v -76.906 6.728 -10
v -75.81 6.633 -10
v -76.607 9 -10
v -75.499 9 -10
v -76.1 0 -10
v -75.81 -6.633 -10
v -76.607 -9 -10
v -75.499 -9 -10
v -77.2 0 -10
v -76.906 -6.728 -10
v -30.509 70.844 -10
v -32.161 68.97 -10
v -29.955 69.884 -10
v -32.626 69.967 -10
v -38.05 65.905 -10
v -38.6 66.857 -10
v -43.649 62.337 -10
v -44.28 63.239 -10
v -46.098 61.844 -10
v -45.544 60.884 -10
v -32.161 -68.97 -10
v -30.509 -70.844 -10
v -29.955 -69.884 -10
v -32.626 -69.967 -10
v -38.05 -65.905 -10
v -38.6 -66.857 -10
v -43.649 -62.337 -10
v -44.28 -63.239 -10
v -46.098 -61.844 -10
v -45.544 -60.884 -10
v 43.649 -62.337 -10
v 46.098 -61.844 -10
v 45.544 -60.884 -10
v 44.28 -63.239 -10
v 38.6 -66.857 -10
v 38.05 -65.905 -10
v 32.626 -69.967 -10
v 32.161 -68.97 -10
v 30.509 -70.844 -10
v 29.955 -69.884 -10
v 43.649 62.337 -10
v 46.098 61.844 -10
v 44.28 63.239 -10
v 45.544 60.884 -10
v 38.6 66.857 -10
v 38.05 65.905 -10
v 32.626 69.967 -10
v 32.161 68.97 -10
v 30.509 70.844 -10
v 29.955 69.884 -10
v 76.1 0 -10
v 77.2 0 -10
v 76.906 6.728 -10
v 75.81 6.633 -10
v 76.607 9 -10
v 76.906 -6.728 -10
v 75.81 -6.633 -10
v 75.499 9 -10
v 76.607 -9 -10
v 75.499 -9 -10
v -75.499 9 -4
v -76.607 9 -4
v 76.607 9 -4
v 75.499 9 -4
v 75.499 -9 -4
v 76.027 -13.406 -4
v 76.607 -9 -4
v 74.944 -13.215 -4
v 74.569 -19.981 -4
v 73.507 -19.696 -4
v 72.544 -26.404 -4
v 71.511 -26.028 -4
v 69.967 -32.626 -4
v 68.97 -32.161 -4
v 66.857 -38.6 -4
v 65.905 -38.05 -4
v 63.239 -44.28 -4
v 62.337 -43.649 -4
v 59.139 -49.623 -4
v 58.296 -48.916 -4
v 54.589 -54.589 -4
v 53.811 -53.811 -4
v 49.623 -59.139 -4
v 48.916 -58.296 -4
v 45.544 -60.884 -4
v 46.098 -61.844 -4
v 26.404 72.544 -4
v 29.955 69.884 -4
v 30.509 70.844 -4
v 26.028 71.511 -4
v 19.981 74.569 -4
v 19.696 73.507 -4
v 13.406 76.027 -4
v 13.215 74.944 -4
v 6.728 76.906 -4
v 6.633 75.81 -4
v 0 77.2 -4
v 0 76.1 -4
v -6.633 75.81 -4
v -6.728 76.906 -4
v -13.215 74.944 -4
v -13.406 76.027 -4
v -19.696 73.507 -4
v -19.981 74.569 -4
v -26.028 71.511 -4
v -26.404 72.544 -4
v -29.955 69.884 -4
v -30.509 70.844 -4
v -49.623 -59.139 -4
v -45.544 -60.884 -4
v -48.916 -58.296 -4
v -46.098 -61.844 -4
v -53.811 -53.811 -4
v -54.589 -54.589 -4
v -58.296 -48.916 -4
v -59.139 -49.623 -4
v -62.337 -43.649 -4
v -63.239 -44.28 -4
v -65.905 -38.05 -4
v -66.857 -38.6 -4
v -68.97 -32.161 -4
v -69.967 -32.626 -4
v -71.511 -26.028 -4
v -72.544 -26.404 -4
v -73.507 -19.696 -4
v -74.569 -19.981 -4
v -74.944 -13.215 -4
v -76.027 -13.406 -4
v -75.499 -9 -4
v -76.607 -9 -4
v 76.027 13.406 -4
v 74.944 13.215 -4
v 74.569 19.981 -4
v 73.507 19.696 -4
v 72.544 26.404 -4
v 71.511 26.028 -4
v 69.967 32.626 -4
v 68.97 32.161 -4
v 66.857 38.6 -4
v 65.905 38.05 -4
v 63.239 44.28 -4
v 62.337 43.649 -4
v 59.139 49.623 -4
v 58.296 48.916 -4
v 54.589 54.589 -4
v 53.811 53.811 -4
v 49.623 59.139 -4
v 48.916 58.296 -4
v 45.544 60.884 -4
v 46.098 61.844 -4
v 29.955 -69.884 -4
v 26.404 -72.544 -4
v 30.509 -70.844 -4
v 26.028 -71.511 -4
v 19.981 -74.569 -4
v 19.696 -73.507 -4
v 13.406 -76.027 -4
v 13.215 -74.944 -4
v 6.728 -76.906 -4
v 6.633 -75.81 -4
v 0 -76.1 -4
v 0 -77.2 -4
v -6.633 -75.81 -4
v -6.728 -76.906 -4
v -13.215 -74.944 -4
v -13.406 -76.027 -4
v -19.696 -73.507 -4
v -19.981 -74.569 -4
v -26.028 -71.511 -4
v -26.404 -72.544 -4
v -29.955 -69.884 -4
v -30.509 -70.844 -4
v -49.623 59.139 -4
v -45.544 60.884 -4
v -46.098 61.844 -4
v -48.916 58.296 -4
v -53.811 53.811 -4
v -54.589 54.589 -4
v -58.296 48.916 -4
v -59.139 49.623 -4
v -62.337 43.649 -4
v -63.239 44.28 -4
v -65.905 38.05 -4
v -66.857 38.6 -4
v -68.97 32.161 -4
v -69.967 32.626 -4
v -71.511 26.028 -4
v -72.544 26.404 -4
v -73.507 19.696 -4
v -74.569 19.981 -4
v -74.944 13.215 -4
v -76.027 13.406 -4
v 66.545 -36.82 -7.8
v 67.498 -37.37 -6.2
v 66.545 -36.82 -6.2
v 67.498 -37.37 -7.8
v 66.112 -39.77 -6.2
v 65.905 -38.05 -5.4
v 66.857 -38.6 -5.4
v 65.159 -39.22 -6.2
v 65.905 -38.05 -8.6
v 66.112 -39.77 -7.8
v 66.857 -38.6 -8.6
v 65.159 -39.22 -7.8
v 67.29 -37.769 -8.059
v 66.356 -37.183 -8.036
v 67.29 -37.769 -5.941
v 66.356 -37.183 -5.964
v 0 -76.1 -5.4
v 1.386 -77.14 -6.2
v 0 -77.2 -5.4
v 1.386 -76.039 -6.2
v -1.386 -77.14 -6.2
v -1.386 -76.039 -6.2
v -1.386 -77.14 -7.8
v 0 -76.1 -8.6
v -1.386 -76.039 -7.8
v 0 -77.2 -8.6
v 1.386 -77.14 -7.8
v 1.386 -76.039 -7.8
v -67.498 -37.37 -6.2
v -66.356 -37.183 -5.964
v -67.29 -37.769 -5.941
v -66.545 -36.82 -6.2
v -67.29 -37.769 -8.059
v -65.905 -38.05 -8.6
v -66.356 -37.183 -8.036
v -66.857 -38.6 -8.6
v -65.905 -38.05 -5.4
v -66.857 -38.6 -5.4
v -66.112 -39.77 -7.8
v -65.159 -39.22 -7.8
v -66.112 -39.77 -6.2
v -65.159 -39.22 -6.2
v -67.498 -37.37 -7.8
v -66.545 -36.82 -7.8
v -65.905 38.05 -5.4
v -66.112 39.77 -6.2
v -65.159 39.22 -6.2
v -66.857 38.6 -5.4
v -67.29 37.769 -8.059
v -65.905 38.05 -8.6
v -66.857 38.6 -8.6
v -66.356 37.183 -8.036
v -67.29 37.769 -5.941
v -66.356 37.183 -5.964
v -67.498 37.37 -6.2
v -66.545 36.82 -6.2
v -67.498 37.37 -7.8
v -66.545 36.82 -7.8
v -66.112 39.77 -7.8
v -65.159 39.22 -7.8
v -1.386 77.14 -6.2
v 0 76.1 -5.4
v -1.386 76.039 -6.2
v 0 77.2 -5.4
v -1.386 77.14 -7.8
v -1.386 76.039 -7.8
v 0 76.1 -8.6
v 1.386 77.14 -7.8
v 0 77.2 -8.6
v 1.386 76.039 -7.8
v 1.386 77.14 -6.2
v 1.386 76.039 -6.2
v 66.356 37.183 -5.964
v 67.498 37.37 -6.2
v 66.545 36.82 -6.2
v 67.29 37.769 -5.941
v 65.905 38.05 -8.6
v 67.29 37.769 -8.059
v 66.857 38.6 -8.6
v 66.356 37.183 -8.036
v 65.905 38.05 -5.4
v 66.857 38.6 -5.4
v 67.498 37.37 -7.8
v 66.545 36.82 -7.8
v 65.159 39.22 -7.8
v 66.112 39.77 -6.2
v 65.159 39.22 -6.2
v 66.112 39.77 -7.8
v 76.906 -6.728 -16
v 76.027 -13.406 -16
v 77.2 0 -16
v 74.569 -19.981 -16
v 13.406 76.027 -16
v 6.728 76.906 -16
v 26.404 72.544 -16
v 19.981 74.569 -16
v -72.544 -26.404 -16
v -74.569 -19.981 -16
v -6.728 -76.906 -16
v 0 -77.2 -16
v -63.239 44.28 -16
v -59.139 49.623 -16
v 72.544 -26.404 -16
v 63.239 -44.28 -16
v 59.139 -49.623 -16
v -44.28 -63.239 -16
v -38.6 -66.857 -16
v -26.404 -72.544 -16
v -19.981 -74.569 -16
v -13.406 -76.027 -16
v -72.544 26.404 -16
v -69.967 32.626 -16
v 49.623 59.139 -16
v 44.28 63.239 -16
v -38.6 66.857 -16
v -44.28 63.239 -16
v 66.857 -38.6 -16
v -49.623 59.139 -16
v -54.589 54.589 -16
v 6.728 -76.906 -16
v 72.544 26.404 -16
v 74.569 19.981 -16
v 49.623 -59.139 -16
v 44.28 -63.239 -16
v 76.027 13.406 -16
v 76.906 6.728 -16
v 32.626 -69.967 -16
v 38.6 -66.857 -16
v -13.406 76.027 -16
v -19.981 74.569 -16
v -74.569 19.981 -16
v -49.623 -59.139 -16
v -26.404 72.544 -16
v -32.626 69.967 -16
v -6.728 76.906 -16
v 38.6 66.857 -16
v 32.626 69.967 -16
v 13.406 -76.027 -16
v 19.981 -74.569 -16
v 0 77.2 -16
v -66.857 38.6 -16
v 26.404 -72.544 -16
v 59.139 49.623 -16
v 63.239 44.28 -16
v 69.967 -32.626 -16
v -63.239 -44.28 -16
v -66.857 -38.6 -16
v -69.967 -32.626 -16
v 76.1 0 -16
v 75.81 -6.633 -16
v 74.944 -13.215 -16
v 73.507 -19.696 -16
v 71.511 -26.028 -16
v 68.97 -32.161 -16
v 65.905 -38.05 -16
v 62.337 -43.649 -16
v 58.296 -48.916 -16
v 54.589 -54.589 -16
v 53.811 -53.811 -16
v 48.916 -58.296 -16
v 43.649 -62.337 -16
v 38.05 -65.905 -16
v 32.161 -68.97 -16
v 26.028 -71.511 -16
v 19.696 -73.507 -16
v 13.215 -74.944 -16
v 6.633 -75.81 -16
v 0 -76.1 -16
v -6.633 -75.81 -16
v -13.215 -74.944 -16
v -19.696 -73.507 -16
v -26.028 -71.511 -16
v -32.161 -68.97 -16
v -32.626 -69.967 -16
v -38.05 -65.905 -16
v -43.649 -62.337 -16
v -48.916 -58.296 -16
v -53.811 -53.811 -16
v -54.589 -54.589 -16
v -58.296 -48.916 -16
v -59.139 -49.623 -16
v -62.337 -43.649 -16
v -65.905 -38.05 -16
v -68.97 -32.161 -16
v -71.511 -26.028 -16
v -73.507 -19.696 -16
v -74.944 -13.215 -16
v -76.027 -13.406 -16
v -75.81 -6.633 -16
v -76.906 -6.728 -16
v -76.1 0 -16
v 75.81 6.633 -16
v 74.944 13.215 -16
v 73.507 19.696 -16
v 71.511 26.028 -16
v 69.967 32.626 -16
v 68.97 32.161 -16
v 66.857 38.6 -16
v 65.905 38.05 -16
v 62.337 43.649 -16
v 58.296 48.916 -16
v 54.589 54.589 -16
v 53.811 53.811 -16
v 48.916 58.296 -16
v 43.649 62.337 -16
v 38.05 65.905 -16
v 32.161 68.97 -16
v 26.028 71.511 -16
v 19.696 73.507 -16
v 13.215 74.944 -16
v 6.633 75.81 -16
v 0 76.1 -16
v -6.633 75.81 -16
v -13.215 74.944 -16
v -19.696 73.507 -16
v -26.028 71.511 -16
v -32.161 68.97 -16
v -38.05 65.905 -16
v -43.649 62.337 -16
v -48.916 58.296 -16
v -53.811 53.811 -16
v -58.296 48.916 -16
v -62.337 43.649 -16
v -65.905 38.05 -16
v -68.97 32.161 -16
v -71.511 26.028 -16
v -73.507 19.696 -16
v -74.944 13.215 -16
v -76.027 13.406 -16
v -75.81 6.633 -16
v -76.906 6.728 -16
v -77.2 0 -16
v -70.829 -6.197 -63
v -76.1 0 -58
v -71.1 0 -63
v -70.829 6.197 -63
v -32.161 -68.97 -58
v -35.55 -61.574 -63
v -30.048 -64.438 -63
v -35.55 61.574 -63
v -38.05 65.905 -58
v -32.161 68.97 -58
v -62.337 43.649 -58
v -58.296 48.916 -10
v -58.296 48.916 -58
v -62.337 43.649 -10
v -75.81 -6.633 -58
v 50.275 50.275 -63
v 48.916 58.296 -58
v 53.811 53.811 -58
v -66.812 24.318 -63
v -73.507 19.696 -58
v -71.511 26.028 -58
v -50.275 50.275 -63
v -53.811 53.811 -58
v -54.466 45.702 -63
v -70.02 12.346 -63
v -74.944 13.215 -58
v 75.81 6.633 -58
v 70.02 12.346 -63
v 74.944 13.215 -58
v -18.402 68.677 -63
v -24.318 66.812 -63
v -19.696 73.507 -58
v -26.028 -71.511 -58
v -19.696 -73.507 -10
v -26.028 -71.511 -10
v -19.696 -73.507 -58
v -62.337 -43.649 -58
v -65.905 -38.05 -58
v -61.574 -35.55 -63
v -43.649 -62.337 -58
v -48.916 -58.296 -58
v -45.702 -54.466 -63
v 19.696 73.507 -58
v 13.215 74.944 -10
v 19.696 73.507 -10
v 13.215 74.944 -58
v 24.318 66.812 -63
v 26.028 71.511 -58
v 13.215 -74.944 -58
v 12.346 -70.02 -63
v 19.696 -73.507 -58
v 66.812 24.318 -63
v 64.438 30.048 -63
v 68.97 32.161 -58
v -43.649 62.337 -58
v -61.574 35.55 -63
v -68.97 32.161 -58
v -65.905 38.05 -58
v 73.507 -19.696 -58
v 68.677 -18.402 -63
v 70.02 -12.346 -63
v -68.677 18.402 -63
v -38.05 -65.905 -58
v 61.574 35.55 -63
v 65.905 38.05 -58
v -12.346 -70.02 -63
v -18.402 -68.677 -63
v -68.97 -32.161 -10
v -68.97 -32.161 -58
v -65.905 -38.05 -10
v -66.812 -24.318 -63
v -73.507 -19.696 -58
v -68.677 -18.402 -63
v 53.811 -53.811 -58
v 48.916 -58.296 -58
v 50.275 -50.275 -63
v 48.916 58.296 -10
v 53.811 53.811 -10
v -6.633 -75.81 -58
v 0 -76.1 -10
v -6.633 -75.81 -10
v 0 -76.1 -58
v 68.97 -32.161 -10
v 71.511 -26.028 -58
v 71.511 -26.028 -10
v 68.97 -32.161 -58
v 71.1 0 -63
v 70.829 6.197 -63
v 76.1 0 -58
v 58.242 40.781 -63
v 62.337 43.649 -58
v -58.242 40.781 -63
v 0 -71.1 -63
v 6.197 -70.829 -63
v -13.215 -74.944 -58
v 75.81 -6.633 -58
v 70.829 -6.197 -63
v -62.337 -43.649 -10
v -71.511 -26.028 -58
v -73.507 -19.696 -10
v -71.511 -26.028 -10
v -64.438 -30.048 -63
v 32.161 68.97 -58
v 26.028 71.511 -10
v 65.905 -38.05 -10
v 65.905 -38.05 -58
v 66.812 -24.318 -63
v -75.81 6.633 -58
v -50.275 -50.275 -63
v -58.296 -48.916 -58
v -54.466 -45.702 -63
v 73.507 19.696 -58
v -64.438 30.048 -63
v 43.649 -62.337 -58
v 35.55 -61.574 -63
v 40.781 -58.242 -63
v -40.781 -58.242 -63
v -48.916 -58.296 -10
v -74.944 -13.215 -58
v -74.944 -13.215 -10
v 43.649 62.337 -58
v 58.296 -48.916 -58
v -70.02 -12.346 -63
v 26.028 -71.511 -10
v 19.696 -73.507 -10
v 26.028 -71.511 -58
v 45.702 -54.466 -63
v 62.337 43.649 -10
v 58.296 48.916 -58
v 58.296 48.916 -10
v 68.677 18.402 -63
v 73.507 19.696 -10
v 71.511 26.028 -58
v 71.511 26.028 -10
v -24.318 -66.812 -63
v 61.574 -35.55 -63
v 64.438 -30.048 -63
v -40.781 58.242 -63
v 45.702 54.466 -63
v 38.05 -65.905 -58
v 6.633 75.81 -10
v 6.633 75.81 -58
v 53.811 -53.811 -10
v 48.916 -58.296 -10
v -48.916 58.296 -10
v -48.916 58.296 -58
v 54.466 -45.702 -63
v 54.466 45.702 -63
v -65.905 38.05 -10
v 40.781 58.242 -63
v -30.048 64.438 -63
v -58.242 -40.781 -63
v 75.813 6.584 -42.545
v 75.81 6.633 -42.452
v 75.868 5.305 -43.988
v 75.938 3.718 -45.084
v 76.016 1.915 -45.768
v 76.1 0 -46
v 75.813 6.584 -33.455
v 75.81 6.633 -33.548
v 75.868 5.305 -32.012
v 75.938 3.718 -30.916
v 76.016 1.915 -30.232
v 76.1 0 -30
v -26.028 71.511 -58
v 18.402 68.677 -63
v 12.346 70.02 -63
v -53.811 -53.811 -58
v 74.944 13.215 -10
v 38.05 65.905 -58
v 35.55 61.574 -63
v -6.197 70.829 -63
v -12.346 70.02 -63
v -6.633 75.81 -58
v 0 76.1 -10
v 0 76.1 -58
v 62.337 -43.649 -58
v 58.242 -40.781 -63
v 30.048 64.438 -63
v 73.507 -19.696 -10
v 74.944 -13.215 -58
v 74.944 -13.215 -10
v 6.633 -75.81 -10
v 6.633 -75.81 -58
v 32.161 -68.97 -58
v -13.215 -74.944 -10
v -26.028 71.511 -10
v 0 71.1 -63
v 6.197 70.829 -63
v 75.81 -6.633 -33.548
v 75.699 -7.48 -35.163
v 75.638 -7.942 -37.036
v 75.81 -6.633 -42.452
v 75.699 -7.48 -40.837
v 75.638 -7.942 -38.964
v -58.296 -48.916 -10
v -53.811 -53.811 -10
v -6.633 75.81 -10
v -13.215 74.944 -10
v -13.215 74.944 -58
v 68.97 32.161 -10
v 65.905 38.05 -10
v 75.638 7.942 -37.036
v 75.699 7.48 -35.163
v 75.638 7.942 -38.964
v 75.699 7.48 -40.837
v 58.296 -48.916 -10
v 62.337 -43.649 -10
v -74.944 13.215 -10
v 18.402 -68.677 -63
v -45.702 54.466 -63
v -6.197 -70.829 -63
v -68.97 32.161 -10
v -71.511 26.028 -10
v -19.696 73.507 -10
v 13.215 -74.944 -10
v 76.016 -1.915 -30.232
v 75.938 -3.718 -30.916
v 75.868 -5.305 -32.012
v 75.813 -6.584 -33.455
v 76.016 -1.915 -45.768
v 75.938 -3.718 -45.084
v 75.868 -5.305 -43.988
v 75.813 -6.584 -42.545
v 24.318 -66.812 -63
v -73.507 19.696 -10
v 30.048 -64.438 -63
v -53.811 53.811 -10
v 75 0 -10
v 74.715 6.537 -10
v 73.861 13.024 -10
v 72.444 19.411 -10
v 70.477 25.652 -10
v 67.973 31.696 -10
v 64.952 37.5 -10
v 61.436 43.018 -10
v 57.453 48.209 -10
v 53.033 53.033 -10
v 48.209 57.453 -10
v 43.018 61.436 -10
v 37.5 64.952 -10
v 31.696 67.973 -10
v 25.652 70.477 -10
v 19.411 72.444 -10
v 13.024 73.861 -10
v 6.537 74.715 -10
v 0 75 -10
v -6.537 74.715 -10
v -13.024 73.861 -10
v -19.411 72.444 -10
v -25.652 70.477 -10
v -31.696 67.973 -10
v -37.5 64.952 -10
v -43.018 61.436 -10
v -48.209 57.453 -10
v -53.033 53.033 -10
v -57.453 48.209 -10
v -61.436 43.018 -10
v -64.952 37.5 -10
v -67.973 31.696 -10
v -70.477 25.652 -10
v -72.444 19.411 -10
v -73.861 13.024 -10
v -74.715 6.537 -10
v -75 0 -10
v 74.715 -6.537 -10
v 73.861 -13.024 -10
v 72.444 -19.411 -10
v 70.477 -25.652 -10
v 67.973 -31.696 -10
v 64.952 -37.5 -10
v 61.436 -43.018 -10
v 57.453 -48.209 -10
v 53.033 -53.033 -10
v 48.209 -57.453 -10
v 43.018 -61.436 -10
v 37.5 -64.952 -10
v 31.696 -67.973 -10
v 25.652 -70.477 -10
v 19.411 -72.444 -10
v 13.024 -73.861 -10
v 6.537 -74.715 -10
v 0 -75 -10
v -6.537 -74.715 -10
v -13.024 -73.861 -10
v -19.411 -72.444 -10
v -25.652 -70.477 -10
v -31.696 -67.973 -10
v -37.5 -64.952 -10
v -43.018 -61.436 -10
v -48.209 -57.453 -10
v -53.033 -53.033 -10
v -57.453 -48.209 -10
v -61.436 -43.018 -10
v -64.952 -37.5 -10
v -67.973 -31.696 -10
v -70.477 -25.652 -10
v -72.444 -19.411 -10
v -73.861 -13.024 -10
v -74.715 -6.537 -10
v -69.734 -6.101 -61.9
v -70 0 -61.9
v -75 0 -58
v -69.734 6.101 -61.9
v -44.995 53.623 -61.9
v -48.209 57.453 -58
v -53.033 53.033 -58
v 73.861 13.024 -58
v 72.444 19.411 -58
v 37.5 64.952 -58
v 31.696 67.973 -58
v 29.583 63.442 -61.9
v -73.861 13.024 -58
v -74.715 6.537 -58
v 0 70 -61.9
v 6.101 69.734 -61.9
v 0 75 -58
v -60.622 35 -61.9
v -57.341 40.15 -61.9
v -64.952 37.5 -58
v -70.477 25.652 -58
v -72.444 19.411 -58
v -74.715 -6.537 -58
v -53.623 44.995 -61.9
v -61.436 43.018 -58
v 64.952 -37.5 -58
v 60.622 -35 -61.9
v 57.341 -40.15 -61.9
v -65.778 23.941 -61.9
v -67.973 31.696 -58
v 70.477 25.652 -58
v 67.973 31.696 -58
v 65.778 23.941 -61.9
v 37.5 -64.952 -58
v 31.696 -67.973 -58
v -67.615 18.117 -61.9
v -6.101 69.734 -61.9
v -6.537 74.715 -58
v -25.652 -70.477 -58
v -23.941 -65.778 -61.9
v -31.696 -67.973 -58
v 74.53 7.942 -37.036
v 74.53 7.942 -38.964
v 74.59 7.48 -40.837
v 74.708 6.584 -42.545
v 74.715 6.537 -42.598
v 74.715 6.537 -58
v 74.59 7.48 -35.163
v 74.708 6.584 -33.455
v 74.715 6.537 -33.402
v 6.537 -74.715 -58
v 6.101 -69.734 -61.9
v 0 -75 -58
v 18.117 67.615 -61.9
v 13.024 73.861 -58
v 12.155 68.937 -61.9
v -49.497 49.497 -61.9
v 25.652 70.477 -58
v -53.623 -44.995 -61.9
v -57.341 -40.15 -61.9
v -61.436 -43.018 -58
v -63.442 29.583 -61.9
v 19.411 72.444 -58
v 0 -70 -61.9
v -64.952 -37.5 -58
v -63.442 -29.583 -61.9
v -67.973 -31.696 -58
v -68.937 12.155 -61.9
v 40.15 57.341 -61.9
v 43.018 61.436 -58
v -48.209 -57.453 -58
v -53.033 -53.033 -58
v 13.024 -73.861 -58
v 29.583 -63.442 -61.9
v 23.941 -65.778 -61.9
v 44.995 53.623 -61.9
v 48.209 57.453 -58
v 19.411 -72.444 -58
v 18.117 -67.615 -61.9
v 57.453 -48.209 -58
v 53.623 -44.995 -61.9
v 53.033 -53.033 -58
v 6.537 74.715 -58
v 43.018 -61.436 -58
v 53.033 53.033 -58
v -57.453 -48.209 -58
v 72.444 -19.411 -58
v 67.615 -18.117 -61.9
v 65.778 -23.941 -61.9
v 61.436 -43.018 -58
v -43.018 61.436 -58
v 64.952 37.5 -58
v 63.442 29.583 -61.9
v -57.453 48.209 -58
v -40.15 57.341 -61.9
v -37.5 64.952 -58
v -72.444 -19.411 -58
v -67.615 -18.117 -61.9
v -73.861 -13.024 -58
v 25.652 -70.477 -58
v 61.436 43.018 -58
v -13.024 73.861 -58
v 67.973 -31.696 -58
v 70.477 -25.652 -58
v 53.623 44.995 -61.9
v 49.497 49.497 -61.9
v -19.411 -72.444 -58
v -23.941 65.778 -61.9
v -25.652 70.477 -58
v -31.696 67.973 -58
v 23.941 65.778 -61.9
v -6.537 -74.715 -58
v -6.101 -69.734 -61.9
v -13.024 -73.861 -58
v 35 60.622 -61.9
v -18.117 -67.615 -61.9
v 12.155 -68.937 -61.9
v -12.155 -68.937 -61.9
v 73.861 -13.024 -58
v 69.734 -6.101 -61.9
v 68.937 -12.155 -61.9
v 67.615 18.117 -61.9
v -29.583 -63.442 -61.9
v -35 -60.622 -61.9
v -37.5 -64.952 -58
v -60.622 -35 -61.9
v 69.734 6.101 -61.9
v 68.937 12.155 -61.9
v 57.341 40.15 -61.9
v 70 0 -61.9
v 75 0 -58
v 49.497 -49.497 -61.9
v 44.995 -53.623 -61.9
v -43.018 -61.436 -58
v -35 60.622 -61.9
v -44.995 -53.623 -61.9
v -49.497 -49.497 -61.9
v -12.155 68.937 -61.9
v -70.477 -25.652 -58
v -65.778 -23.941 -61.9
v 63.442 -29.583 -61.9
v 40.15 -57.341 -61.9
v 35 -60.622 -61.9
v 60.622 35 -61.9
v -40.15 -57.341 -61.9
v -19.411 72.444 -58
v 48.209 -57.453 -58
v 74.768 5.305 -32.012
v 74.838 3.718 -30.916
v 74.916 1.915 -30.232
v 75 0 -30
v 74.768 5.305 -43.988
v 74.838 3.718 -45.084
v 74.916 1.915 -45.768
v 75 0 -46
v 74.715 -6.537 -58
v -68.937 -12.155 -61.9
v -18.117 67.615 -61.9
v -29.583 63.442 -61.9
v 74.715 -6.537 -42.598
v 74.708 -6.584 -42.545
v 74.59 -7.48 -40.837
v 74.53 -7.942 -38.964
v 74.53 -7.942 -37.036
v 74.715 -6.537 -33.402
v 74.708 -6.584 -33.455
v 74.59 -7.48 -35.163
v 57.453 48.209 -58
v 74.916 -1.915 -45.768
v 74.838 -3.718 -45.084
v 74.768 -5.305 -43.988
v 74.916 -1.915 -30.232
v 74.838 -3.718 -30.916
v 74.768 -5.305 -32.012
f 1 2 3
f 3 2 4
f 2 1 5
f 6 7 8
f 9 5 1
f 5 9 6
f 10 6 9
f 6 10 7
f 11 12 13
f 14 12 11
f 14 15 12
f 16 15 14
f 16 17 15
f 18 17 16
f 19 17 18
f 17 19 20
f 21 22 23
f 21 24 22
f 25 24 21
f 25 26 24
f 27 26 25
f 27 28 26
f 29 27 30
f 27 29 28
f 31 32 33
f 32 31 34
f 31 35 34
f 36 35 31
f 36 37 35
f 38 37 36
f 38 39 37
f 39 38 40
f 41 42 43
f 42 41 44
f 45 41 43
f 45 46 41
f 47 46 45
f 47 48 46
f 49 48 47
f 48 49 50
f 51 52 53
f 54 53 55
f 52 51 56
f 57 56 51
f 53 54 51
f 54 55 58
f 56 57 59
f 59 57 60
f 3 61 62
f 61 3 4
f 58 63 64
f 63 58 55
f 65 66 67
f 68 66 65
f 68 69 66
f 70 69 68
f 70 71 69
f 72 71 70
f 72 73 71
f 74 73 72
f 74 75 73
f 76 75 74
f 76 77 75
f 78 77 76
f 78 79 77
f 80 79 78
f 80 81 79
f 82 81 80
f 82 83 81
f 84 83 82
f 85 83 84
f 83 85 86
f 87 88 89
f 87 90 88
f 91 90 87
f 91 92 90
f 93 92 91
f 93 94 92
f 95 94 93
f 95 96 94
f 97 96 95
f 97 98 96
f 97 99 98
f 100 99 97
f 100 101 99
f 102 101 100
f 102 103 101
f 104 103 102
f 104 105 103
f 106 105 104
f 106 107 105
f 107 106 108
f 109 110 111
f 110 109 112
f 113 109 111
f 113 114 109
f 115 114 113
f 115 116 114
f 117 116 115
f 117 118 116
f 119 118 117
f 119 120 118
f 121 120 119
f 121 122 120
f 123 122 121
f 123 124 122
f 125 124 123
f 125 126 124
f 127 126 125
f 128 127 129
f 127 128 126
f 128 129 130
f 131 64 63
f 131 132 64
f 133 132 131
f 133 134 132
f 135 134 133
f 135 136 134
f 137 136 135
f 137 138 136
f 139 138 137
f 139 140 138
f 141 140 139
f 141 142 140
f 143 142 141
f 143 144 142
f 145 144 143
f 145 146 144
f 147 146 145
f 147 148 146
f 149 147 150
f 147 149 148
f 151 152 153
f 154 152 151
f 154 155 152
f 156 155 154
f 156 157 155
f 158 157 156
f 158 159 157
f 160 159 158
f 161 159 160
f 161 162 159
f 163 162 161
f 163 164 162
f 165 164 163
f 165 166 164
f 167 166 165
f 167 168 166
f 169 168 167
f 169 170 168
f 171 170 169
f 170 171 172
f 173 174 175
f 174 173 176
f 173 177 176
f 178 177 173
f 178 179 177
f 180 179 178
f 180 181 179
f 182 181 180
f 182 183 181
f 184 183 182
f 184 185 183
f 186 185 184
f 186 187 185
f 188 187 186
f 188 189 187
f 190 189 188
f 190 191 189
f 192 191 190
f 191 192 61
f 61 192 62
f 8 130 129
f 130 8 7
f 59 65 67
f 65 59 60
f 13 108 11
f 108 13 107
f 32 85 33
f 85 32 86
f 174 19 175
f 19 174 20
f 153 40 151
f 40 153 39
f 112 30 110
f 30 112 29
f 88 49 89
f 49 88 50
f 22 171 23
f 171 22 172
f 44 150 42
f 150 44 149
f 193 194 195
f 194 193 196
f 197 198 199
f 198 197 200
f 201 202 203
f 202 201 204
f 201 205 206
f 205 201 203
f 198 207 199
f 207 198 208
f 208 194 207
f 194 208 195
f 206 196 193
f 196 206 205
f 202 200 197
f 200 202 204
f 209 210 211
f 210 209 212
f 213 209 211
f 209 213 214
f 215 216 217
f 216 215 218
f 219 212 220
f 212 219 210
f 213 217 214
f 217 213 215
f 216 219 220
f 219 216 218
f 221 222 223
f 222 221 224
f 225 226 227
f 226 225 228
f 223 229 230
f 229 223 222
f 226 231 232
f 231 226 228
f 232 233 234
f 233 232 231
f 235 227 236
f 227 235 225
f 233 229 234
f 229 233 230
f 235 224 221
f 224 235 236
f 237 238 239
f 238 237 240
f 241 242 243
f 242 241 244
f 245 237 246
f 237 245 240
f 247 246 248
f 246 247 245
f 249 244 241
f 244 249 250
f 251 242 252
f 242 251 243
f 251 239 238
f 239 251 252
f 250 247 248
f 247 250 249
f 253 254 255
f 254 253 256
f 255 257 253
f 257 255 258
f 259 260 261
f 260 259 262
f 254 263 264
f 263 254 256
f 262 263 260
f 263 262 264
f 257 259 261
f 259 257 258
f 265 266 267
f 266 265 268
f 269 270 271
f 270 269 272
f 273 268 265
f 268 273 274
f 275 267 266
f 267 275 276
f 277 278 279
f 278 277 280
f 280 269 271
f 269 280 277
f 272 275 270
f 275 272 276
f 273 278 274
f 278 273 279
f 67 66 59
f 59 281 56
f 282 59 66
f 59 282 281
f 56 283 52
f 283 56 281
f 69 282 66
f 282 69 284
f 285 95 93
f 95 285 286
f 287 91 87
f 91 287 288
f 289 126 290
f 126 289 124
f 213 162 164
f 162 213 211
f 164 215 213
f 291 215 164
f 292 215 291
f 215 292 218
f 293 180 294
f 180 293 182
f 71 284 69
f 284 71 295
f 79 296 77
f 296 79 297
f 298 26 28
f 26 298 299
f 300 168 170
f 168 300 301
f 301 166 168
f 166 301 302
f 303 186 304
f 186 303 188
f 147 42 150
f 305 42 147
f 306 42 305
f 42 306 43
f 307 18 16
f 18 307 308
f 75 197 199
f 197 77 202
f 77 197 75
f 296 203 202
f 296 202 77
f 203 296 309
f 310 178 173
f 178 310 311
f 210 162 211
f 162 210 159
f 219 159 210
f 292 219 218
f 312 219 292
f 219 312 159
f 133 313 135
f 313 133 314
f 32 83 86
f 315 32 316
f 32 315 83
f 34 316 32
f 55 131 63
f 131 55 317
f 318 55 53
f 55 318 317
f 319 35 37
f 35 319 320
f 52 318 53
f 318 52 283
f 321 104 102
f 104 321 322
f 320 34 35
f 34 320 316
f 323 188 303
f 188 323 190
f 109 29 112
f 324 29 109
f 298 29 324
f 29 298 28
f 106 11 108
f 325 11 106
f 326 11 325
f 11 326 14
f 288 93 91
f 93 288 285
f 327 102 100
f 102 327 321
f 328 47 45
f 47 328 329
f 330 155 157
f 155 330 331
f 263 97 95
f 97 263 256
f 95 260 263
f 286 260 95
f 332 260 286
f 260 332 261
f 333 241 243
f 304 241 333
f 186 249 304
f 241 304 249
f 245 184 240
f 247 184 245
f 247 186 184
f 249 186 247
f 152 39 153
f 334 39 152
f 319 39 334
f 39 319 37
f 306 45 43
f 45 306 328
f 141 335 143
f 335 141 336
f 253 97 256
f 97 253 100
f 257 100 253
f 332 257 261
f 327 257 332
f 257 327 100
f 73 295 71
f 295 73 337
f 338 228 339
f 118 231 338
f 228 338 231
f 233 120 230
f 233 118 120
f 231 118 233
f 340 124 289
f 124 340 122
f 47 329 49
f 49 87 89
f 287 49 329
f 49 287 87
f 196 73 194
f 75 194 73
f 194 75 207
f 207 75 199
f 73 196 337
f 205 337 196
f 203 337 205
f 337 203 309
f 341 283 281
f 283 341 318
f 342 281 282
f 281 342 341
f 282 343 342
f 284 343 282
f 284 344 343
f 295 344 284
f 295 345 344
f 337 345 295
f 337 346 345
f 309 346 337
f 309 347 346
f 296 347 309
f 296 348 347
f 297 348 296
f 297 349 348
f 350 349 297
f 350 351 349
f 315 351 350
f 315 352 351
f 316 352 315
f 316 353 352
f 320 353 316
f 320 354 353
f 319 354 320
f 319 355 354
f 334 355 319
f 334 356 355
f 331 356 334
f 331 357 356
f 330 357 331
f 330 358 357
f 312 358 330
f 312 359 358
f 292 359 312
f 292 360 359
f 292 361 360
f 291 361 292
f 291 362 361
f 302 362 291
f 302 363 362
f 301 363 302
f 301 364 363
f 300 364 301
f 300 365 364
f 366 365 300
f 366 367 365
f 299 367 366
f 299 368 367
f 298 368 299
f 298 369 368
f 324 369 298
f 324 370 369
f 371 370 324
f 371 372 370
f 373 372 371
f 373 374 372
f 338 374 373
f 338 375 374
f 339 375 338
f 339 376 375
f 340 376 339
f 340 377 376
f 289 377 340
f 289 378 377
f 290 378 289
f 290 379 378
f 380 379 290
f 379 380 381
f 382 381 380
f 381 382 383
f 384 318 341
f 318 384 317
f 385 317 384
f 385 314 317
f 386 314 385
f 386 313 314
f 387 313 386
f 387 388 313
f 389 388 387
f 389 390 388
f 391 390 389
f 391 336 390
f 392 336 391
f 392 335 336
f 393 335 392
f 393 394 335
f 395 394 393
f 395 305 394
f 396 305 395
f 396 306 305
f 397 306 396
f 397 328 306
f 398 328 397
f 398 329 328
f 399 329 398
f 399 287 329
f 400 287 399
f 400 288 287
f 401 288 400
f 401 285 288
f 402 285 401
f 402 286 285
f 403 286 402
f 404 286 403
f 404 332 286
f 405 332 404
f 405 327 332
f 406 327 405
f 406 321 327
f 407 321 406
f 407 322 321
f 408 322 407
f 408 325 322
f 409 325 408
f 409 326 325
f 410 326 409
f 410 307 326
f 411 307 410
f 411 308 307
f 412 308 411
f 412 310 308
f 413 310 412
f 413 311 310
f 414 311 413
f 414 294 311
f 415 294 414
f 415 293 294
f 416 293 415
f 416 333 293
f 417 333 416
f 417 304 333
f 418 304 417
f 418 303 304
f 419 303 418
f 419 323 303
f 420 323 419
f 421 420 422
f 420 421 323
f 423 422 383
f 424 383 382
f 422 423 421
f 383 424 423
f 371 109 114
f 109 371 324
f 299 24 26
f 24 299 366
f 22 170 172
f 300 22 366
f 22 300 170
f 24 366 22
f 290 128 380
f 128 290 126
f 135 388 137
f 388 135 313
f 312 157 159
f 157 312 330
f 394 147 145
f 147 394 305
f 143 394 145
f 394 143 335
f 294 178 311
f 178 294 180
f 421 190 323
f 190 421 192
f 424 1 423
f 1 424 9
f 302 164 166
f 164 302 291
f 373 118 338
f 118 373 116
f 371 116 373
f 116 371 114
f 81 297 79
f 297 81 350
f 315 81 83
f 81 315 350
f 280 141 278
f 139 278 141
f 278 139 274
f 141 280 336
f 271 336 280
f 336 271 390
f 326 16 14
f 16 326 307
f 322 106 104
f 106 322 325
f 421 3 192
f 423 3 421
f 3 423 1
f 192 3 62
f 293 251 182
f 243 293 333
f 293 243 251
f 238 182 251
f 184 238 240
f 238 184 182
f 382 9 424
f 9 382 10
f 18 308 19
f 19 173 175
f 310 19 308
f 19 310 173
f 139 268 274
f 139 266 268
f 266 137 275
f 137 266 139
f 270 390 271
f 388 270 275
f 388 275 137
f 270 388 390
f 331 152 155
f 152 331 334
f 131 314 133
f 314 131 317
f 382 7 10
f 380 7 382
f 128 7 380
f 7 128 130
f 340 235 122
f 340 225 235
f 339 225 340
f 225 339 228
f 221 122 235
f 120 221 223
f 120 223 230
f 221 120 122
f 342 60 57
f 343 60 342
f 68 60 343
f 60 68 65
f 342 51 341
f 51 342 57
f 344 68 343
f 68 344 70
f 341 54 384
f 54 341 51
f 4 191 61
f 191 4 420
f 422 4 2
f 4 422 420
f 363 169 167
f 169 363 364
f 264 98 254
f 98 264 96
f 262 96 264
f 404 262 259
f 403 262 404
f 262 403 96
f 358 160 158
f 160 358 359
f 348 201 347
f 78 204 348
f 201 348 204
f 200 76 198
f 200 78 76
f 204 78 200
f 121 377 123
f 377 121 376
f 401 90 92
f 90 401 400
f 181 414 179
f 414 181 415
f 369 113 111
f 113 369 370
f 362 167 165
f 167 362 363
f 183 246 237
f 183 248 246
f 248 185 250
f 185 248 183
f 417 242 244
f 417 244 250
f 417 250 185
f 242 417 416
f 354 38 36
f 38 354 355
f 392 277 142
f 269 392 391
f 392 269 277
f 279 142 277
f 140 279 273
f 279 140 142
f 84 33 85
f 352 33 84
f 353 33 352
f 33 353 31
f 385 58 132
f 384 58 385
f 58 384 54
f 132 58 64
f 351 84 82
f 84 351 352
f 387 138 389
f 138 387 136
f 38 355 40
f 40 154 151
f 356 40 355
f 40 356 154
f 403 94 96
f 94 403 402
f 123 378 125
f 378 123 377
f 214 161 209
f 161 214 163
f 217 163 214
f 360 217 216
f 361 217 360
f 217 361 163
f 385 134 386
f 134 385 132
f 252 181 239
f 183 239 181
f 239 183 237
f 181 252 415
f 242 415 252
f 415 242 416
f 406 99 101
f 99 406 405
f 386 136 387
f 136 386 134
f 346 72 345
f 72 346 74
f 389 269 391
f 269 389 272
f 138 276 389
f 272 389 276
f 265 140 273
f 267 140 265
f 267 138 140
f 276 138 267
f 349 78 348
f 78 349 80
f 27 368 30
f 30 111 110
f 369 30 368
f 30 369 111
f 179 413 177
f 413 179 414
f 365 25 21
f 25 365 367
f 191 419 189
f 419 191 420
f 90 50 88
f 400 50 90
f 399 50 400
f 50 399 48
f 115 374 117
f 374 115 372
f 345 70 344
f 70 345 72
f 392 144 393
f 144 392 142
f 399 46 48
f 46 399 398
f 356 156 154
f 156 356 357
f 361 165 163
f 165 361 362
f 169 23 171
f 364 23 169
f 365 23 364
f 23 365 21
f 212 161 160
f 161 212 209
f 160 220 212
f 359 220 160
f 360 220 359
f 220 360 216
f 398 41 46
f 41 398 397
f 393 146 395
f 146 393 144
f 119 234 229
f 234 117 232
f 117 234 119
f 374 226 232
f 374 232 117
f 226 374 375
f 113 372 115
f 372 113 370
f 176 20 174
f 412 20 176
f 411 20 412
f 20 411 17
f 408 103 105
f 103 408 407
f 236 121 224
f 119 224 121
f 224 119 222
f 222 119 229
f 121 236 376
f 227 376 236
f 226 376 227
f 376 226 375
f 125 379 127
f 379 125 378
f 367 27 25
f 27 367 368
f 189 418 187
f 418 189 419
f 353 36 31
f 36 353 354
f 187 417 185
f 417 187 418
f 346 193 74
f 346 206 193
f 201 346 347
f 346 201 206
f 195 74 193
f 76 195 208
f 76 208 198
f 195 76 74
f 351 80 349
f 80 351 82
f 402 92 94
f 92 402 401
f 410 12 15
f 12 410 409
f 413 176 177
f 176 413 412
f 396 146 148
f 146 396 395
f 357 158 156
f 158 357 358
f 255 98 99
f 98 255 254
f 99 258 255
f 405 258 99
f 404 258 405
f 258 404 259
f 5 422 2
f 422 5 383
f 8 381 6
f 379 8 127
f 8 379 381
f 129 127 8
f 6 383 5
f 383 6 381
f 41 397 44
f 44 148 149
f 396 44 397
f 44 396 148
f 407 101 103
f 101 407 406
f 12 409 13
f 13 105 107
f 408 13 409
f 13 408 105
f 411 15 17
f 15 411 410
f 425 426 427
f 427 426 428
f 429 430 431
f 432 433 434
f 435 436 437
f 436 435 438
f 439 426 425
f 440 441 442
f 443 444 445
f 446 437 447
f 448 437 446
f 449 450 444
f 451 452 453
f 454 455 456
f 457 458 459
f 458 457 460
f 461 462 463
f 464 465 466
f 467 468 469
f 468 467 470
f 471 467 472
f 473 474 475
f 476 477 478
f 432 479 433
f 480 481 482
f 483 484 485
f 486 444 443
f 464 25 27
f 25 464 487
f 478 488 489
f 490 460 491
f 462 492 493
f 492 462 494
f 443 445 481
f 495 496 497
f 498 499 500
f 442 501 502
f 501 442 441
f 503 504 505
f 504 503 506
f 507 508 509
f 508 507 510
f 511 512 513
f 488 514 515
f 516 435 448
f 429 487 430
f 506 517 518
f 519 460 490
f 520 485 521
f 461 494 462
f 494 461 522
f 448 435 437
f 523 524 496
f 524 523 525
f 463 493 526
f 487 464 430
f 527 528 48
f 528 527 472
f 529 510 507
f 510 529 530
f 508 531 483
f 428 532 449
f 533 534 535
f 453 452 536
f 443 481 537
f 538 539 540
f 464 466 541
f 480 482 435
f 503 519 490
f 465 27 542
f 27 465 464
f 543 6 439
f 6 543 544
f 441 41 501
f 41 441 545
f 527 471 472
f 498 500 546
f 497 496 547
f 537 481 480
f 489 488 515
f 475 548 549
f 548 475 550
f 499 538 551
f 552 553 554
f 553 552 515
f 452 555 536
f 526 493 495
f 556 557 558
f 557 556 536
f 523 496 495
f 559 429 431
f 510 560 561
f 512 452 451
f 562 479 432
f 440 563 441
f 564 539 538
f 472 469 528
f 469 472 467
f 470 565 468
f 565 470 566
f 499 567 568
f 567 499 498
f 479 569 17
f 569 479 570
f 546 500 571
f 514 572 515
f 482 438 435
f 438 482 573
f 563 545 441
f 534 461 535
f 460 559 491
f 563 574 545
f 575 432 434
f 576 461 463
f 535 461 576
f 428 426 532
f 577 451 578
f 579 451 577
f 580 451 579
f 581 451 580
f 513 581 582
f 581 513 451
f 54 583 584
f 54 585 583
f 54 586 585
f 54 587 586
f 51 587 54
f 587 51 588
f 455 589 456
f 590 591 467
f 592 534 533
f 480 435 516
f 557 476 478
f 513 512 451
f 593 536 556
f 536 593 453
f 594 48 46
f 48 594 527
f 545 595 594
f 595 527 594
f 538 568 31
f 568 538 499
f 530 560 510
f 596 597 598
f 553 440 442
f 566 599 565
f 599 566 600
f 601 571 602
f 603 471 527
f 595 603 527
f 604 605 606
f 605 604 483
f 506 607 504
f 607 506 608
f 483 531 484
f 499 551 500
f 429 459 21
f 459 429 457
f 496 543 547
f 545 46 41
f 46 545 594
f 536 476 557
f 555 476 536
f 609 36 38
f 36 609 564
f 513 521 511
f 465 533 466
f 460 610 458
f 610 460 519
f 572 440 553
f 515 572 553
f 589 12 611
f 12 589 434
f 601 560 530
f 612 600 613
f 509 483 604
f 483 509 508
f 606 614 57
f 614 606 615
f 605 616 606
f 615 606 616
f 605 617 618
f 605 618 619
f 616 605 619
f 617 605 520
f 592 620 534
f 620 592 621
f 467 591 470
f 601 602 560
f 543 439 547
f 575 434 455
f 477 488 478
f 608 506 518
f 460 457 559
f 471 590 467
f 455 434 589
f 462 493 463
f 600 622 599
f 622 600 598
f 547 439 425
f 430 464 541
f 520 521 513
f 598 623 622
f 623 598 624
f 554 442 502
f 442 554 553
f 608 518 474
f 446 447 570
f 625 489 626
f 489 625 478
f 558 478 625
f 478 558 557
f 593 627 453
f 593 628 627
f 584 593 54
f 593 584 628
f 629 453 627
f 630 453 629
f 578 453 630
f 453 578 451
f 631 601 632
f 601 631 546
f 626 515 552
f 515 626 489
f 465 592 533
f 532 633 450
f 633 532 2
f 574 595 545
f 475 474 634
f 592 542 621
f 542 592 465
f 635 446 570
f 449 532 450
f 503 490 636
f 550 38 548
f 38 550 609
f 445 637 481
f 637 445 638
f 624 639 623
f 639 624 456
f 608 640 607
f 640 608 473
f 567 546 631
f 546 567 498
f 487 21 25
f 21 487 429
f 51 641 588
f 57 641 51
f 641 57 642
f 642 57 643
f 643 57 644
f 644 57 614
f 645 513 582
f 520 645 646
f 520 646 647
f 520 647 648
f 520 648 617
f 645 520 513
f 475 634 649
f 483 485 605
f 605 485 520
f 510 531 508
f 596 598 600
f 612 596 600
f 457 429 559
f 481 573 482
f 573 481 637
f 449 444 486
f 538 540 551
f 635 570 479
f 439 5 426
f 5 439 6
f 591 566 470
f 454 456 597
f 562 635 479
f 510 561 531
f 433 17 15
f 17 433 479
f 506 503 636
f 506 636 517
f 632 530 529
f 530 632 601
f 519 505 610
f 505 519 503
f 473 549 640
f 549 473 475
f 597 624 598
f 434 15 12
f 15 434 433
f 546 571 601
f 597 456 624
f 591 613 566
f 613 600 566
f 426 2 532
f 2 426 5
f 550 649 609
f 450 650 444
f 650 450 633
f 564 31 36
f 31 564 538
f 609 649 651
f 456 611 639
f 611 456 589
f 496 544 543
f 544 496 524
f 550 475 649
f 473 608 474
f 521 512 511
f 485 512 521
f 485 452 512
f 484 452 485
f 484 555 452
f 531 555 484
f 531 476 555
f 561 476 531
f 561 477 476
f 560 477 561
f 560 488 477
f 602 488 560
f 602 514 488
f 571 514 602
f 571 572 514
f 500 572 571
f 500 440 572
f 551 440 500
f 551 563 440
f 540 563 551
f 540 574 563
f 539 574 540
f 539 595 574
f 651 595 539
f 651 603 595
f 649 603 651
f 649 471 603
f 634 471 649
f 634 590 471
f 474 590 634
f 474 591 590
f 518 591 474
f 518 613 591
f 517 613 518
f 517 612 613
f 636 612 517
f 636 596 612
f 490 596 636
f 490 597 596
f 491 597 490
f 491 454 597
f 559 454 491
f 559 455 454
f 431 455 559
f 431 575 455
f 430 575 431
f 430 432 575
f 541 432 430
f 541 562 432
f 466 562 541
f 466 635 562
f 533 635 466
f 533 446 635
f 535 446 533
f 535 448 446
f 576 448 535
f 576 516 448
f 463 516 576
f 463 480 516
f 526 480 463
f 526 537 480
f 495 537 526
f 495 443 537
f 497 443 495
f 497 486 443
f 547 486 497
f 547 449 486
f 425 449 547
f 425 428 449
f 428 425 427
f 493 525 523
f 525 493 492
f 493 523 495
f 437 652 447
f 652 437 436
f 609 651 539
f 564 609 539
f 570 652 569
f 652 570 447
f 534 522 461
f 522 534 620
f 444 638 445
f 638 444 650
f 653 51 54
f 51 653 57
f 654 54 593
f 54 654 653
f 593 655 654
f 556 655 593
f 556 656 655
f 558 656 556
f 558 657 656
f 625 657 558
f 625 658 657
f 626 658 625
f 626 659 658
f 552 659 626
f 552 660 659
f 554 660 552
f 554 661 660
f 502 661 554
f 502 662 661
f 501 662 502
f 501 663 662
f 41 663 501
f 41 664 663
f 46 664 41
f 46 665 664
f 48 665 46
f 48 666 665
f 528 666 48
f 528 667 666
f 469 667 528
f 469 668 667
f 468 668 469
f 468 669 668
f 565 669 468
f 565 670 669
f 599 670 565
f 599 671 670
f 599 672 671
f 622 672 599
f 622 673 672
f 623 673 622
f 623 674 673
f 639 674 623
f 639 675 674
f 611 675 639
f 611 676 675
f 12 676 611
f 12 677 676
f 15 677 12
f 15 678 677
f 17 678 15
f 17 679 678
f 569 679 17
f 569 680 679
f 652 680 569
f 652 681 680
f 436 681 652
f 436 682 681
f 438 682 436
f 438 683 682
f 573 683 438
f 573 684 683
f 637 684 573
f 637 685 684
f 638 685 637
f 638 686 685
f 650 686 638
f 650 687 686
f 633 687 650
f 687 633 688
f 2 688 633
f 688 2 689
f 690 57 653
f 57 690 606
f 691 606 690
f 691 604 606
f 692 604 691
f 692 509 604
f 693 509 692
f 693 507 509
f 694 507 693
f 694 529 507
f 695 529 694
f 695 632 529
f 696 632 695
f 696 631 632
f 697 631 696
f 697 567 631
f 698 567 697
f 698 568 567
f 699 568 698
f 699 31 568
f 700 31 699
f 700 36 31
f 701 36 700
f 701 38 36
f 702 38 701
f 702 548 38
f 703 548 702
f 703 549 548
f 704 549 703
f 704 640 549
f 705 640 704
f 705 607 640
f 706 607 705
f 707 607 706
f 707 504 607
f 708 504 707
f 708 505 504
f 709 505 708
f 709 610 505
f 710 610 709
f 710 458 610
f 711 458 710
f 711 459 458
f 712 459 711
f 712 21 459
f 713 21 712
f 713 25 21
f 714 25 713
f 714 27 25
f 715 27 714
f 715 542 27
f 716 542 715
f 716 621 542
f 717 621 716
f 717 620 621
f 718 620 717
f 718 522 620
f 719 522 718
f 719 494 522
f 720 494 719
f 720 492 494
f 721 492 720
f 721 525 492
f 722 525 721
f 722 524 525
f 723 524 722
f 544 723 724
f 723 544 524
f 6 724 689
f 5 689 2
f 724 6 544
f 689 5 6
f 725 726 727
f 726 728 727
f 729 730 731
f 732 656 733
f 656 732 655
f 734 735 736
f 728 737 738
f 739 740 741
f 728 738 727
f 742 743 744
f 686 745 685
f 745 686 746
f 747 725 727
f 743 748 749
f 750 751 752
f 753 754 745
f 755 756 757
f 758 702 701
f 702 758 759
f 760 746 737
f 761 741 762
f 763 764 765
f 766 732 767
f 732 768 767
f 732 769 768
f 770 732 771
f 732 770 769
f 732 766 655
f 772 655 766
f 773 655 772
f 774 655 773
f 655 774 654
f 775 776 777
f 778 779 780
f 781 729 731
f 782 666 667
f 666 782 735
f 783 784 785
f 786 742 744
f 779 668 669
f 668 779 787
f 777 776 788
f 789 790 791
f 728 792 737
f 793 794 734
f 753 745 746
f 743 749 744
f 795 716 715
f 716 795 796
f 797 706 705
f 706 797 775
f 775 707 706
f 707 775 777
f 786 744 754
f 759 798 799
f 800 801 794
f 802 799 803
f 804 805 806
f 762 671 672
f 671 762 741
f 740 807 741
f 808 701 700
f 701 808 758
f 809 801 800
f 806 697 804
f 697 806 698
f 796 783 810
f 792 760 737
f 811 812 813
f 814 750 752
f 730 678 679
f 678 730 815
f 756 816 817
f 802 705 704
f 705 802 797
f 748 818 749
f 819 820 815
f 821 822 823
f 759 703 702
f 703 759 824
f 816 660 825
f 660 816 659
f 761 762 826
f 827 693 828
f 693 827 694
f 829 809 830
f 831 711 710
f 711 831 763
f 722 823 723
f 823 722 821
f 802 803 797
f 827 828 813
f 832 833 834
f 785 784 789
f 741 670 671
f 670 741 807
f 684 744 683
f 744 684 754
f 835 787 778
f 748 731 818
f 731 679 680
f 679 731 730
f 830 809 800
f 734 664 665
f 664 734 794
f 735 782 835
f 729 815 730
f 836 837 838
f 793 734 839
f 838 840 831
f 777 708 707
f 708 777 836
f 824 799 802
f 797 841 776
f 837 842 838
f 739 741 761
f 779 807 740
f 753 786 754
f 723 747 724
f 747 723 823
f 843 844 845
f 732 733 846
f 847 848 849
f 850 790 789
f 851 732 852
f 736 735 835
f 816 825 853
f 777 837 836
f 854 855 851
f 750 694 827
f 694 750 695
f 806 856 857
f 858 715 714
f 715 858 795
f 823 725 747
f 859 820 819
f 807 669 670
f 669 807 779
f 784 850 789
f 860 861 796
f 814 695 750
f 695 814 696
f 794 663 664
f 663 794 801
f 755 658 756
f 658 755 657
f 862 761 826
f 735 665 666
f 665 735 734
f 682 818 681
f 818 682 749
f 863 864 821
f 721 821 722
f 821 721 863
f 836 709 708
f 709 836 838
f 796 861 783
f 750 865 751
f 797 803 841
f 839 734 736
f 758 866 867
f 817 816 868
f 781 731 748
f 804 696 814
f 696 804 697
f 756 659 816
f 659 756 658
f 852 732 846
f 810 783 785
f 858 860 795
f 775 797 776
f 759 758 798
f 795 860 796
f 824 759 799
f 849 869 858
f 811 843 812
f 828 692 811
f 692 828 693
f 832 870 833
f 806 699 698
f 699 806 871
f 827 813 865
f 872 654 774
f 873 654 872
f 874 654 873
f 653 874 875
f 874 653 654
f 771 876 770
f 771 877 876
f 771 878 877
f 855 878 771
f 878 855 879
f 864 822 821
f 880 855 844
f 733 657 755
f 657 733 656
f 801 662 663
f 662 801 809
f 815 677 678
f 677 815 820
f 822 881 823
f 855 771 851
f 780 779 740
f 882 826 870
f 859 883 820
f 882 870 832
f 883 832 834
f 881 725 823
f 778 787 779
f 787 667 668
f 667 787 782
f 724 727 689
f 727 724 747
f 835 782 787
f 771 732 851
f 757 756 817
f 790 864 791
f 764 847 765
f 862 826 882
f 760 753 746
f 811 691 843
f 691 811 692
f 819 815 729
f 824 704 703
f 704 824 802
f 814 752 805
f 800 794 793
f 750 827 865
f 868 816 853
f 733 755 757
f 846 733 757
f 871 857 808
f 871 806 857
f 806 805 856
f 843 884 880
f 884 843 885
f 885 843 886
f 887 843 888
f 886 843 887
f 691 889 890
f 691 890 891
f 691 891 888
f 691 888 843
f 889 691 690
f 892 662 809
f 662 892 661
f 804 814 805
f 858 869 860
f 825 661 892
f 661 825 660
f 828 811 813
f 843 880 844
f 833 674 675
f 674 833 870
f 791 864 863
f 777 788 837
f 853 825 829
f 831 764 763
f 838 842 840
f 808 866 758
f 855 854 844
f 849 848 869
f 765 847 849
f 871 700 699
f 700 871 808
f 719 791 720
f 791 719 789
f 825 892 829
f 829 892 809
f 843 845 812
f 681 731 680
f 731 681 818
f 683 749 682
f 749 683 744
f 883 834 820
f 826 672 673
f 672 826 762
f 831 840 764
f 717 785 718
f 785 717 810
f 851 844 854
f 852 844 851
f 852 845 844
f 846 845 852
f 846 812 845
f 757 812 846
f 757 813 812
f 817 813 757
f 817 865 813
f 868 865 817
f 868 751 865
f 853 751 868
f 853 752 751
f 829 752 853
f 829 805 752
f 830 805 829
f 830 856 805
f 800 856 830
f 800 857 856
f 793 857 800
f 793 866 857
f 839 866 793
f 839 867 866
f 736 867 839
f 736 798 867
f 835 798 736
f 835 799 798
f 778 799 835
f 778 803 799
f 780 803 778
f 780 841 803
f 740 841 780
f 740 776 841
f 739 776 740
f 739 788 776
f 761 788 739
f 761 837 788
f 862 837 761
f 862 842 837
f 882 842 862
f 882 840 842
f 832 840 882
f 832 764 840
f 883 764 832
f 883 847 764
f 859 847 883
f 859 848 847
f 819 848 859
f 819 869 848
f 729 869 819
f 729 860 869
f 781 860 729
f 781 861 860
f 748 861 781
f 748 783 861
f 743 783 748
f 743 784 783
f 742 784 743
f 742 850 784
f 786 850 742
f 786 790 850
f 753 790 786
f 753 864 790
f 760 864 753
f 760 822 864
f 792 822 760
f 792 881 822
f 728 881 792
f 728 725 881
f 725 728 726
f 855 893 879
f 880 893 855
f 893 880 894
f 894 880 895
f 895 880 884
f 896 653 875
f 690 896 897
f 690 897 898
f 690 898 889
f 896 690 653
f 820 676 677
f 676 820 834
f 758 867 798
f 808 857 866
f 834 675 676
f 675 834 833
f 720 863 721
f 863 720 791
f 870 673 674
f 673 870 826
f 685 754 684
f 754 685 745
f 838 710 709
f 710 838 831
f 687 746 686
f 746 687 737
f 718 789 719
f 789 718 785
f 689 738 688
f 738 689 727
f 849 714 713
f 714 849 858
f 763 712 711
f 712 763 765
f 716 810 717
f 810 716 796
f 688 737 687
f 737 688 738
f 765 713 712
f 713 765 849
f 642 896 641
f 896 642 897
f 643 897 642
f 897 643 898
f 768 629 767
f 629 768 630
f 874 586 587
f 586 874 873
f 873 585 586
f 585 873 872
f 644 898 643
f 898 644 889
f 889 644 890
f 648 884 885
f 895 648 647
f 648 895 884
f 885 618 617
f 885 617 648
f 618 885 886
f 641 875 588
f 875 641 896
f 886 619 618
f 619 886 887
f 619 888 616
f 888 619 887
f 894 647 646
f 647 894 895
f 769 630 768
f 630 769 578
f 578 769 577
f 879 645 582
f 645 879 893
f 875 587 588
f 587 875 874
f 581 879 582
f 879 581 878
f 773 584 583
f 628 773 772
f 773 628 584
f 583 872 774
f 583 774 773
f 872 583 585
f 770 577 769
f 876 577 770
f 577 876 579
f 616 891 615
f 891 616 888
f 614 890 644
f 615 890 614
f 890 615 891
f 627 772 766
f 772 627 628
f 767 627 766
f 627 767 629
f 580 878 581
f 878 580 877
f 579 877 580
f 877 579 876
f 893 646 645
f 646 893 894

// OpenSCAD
print_top = false;
print_base = false;
print_arm = false;
print_bottom = true;
print_battery_holder = false;
print_support_sticks = false;


support_stick_width = 20;
support_stick_height = 3;
top_with_camera_hole = false;
bottom_with_camera_hole = true;
bottom_camera_hole_height = 20;
camera_hole_radius = 8;


num_rotor = 6;
base_radius = 75;
base_top_height = 30;
base_top_fillet = 20;
bottom_height = 48;
bottom_fillet = 5;


length_arm = 95;
width_arm = 18;
length_arm_mount = 40;
arm_mount_hole_radius = 1.6;
arm_mount_hole_margin = 4;
arm_top_overlap = 3;
strength = 6;
strength_top = 1.1;
strength_mount = strength*0.66;

margin_motor_to_arm = 3;

screw_hole_length_top_mount = 10;
screw_hole_radius_top_mount = 1.6;

motor_radius = 12;
motor_hole_margin_1 = 5;
motor_hole_margin_2 = 8;
motor_hole_radius = 1.6;
motor_inner_hole_radius = 3;
motor_hole_rotate_angle = 45;

battery_width = 100;
battery_height = 40;
battery_length = 150;
battery_holder_strength = 1;

BIG_INT = 2000;

$fa = 5;
//$fa = 30;









translate([0,0,-100]){
if(print_battery_holder){
difference(){
cube([battery_length,battery_width,battery_height]);
translate([battery_holder_strength,battery_holder_strength,battery_holder_strength]) cube([battery_length,battery_width-2*battery_holder_strength,battery_height-2*battery_holder_strength]);
}
}
}






if(print_support_sticks) {
    translate([0,0,200]) {
        deg = 360/num_rotor;
        len = base_radius+length_arm-motor_radius+margin_motor_to_arm;
        len_stick = 2*len*sin(deg/2);
        len_stick_short = 2*(len-support_stick_width)*sin(deg/2);
        len_stick_dif = (len_stick-len_stick_short)/2;
    linear_extrude(support_stick_height) polygon([[0,0],[len_stick,0],[len_stick-len_stick_dif,support_stick_width],[len_stick_dif,support_stick_width]]);
        //len_c = 1/(sin(deg)/width_arm);
        //polygon([[0,0],[0,len_stick],[support_stick_width,len_stick-len_c],[support_stick_width,len_c]]);
        
    }
}






if(print_bottom) {
//bottom
rotate([180,0,0])translate([0,0,10]){
  
translate([0,0,-strength])  {
    difference() { //bottom base plate combiner
        cylinder(strength*2,base_radius+strength_top*2,base_radius+strength_top*2);
        cylinder(strength*2,base_radius+strength_top,base_radius+strength_top);
        for(i = [0:num_rotor]) { // for each rotor make a hole in the top
            rotate([0,0,i*(360/num_rotor)]) {
                //translate([0,0,strength])rotate([90,0,90]) cylinder(length_arm-motor_radius,width_arm/2,width_arm/2);
                rotate([0,0,90])translate([-width_arm/2,-base_radius*2,0])cube([width_arm,base_radius*4,strength]);

            }
        }
translate([0,0,strength])
for(i = [0:num_rotor]) { // make screwhole in the side for the top/bottom,base part
rotate([0,0,i*(360/num_rotor)+(360/num_rotor)/2]) {
    translate([base_radius-screw_hole_length_top_mount,0,strength/2-strength]) rotate([0,90,0]) cylinder(base_radius/2,screw_hole_radius_top_mount,screw_hole_radius_top_mount);
}
}
	}
} 

difference() { //make hollow bottom

union() {
rotate_extrude(angle = 360)polygon([[0,0],[base_radius+strength_top,0],[base_radius+strength_top,bottom_height],[base_radius+strength_top-bottom_fillet,bottom_height+bottom_fillet],[0,bottom_height+bottom_fillet]]); //outer bottom
}

rotate_extrude(angle = 360)polygon([[0,0],[base_radius,0],[base_radius,bottom_height],[base_radius-bottom_fillet,bottom_height+bottom_fillet-strength_top],[0,bottom_height+bottom_fillet-strength_top]]); //hole out inner top

translate([-BIG_INT,-BIG_INT,-BIG_INT]) cube([BIG_INT*2,BIG_INT*2,BIG_INT]);

if(bottom_with_camera_hole) { //make hole for camera
translate([0,0,0])
rotate([0,0,0]) {
    translate([0,0,bottom_height-bottom_camera_hole_height]) rotate([0,90,0]) cylinder(base_radius*2,camera_hole_radius,camera_hole_radius);

}
}


} //difference


} //translate top
}



if(print_top) {
//top
translate([0,0,20]){
  
translate([0,0,-strength])  {
    difference() { //top base plate combiner
        cylinder(strength*2,base_radius+strength_top,base_radius+strength_top);
        cylinder(strength*2,base_radius,base_radius);
        for(i = [0:num_rotor]) { // for each rotor make a hole in the top
            rotate([0,0,i*(360/num_rotor)]) {
                translate([0,0,strength])rotate([90,0,90]) cylinder(length_arm-motor_radius,width_arm/2,width_arm/2);
                rotate([0,0,90])translate([-width_arm/2,-base_radius*2,0])cube([width_arm,base_radius*4,strength]);

            }
        }
    
translate([0,0,strength])
for(i = [0:num_rotor]) { // make screwhole in the side for the top/bottom,base part
rotate([0,0,i*(360/num_rotor)+(360/num_rotor)/2]) {
    translate([base_radius-screw_hole_length_top_mount,0,strength/2-strength]) rotate([0,90,0]) cylinder(base_radius/2,screw_hole_radius_top_mount,screw_hole_radius_top_mount);
}
}

	}
} 

difference() { //make hollow top

union() {
rotate_extrude(angle = 360)polygon([[0,0],[base_radius,0],[base_radius,base_top_height],[base_radius-base_top_fillet,base_top_height+base_top_fillet],[0,base_top_height+base_top_fillet]]); //outer top
for(i = [0:num_rotor]) { // for each rotor make a overlap
	rotate([0,0,i*(360/num_rotor)]) {
		rotate([90,0,90]) cylinder(base_radius+arm_top_overlap,width_arm/2+strength_top,width_arm/2+strength_top);
	}
}
}

rotate_extrude(angle = 360)polygon([[0,0],[base_radius-strength_top,0],[base_radius-strength_top,base_top_height],[base_radius-base_top_fillet-strength_top,base_top_height+base_top_fillet-strength_top],[0,base_top_height+base_top_fillet-strength_top]]); //hole out inner top


for(i = [0:num_rotor]) { // for each rotor make a hole in the top
	rotate([0,0,i*(360/num_rotor)]) {
		rotate([90,0,90]) cylinder(length_arm-motor_radius,width_arm/2,width_arm/2);
	}
}

translate([-BIG_INT,-BIG_INT,-BIG_INT]) cube([BIG_INT*2,BIG_INT*2,BIG_INT]); // cut off bottom parts of arm overlap


if(top_with_camera_hole) { //make hole for camera
translate([0,0,0])
rotate([0,0,(360/num_rotor)/2]) {
    translate([0,0,base_top_height/2+strength/2]) rotate([0,90,0]) cylinder(base_radius,camera_hole_radius,camera_hole_radius);

}
}

} //difference


} //translate top
}

if(print_base) {
//base
difference() {
linear_extrude(strength) { //main base floor
circle(base_radius);
}

for(i = [0:num_rotor]) { // for each rotor make the arm mount gap with holes
rotate([0,0,i*(360/num_rotor)]) {
	translate([base_radius,-width_arm/2,0]) {
	linear_extrude(strength_mount) difference() { //arm mount
			polygon([[0,0],[-length_arm_mount,width_arm/2],[0,width_arm]]); //gap for mounting
	}
	linear_extrude(300) { //make skrew holes
	translate([-arm_mount_hole_margin,arm_mount_hole_margin+(arm_mount_hole_margin/length_arm_mount)*width_arm/2,0]) circle(arm_mount_hole_radius); //hole 1
	translate([-arm_mount_hole_margin,width_arm-(arm_mount_hole_margin+(arm_mount_hole_margin/length_arm_mount)*width_arm/2),0]) circle(arm_mount_hole_radius); //hole 2
	translate([-length_arm_mount+arm_mount_hole_margin*3,width_arm/2,0]) circle(arm_mount_hole_radius); ////hole 3 attention: margin hack
	}
}

}
}

for(i = [0:num_rotor]) { // make screwhole in the side for the top part
rotate([0,0,i*(360/num_rotor)+(360/num_rotor)/2]) {
    translate([base_radius-screw_hole_length_top_mount,0,strength/2]) rotate([0,90,0]) cylinder(screw_hole_length_top_mount,screw_hole_radius_top_mount,screw_hole_radius_top_mount);
}
}
}
}

if(print_arm) {
//one arm
translate([base_radius*2,0,0])
difference() {
	union() {
		linear_extrude(strength_mount) {
			//circle(base_radius);

			difference(){
				union(){ //bottom parts of arm and motor mount
					translate([0,-width_arm/2,0])square([length_arm,width_arm]);
					translate([length_arm+margin_motor_to_arm,0,0])circle(motor_radius);
				}
				translate([length_arm+margin_motor_to_arm,0,0]) //cut out holes for motor mount
					rotate([0,0,motor_hole_rotate_angle]) {
						translate([motor_hole_margin_2,0,0]) circle(motor_hole_radius);
						translate([0,motor_hole_margin_1,0]) circle(motor_hole_radius);
						translate([-motor_hole_margin_2,0,0]) circle(motor_hole_radius);
						translate([0,-motor_hole_margin_1,0]) circle(motor_hole_radius);
                        translate([0,0,0]) circle(motor_inner_hole_radius);
					}

			}
		}
		
		linear_extrude(strength_mount)translate([0,-width_arm/2,0]) difference() { //arm mount
			polygon([[0,0],[-length_arm_mount,width_arm/2],[0,width_arm]]);
			translate([-arm_mount_hole_margin,arm_mount_hole_margin+(arm_mount_hole_margin/length_arm_mount)*width_arm/2,0]) circle(arm_mount_hole_radius); //hole 1
			translate([-arm_mount_hole_margin,width_arm-(arm_mount_hole_margin+(arm_mount_hole_margin/length_arm_mount)*width_arm/2),0]) circle(arm_mount_hole_radius); //hole 2
			translate([-length_arm_mount+arm_mount_hole_margin*3,width_arm/2,0]) circle(arm_mount_hole_radius); ////hole 3 attention: margin hack

		}

		translate([0,0,strength_mount]){ //roof of arm
			rotate([90,0,90]) {
				difference(){
					cylinder(length_arm-motor_radius,width_arm/2,width_arm/2);
					cylinder(length_arm-motor_radius,width_arm/2-strength_top,width_arm/2-strength_top);
				}		
                
            }
			
		}
	}
	translate([-BIG_INT,-BIG_INT,-BIG_INT]) cube([BIG_INT*2,BIG_INT*2,BIG_INT]);
    //translate([-base_radius+3,0,strength_mount])cylinder(strength-strength_mount,base_radius,base_radius); //cut out base radius in arm (hack)

}
}
